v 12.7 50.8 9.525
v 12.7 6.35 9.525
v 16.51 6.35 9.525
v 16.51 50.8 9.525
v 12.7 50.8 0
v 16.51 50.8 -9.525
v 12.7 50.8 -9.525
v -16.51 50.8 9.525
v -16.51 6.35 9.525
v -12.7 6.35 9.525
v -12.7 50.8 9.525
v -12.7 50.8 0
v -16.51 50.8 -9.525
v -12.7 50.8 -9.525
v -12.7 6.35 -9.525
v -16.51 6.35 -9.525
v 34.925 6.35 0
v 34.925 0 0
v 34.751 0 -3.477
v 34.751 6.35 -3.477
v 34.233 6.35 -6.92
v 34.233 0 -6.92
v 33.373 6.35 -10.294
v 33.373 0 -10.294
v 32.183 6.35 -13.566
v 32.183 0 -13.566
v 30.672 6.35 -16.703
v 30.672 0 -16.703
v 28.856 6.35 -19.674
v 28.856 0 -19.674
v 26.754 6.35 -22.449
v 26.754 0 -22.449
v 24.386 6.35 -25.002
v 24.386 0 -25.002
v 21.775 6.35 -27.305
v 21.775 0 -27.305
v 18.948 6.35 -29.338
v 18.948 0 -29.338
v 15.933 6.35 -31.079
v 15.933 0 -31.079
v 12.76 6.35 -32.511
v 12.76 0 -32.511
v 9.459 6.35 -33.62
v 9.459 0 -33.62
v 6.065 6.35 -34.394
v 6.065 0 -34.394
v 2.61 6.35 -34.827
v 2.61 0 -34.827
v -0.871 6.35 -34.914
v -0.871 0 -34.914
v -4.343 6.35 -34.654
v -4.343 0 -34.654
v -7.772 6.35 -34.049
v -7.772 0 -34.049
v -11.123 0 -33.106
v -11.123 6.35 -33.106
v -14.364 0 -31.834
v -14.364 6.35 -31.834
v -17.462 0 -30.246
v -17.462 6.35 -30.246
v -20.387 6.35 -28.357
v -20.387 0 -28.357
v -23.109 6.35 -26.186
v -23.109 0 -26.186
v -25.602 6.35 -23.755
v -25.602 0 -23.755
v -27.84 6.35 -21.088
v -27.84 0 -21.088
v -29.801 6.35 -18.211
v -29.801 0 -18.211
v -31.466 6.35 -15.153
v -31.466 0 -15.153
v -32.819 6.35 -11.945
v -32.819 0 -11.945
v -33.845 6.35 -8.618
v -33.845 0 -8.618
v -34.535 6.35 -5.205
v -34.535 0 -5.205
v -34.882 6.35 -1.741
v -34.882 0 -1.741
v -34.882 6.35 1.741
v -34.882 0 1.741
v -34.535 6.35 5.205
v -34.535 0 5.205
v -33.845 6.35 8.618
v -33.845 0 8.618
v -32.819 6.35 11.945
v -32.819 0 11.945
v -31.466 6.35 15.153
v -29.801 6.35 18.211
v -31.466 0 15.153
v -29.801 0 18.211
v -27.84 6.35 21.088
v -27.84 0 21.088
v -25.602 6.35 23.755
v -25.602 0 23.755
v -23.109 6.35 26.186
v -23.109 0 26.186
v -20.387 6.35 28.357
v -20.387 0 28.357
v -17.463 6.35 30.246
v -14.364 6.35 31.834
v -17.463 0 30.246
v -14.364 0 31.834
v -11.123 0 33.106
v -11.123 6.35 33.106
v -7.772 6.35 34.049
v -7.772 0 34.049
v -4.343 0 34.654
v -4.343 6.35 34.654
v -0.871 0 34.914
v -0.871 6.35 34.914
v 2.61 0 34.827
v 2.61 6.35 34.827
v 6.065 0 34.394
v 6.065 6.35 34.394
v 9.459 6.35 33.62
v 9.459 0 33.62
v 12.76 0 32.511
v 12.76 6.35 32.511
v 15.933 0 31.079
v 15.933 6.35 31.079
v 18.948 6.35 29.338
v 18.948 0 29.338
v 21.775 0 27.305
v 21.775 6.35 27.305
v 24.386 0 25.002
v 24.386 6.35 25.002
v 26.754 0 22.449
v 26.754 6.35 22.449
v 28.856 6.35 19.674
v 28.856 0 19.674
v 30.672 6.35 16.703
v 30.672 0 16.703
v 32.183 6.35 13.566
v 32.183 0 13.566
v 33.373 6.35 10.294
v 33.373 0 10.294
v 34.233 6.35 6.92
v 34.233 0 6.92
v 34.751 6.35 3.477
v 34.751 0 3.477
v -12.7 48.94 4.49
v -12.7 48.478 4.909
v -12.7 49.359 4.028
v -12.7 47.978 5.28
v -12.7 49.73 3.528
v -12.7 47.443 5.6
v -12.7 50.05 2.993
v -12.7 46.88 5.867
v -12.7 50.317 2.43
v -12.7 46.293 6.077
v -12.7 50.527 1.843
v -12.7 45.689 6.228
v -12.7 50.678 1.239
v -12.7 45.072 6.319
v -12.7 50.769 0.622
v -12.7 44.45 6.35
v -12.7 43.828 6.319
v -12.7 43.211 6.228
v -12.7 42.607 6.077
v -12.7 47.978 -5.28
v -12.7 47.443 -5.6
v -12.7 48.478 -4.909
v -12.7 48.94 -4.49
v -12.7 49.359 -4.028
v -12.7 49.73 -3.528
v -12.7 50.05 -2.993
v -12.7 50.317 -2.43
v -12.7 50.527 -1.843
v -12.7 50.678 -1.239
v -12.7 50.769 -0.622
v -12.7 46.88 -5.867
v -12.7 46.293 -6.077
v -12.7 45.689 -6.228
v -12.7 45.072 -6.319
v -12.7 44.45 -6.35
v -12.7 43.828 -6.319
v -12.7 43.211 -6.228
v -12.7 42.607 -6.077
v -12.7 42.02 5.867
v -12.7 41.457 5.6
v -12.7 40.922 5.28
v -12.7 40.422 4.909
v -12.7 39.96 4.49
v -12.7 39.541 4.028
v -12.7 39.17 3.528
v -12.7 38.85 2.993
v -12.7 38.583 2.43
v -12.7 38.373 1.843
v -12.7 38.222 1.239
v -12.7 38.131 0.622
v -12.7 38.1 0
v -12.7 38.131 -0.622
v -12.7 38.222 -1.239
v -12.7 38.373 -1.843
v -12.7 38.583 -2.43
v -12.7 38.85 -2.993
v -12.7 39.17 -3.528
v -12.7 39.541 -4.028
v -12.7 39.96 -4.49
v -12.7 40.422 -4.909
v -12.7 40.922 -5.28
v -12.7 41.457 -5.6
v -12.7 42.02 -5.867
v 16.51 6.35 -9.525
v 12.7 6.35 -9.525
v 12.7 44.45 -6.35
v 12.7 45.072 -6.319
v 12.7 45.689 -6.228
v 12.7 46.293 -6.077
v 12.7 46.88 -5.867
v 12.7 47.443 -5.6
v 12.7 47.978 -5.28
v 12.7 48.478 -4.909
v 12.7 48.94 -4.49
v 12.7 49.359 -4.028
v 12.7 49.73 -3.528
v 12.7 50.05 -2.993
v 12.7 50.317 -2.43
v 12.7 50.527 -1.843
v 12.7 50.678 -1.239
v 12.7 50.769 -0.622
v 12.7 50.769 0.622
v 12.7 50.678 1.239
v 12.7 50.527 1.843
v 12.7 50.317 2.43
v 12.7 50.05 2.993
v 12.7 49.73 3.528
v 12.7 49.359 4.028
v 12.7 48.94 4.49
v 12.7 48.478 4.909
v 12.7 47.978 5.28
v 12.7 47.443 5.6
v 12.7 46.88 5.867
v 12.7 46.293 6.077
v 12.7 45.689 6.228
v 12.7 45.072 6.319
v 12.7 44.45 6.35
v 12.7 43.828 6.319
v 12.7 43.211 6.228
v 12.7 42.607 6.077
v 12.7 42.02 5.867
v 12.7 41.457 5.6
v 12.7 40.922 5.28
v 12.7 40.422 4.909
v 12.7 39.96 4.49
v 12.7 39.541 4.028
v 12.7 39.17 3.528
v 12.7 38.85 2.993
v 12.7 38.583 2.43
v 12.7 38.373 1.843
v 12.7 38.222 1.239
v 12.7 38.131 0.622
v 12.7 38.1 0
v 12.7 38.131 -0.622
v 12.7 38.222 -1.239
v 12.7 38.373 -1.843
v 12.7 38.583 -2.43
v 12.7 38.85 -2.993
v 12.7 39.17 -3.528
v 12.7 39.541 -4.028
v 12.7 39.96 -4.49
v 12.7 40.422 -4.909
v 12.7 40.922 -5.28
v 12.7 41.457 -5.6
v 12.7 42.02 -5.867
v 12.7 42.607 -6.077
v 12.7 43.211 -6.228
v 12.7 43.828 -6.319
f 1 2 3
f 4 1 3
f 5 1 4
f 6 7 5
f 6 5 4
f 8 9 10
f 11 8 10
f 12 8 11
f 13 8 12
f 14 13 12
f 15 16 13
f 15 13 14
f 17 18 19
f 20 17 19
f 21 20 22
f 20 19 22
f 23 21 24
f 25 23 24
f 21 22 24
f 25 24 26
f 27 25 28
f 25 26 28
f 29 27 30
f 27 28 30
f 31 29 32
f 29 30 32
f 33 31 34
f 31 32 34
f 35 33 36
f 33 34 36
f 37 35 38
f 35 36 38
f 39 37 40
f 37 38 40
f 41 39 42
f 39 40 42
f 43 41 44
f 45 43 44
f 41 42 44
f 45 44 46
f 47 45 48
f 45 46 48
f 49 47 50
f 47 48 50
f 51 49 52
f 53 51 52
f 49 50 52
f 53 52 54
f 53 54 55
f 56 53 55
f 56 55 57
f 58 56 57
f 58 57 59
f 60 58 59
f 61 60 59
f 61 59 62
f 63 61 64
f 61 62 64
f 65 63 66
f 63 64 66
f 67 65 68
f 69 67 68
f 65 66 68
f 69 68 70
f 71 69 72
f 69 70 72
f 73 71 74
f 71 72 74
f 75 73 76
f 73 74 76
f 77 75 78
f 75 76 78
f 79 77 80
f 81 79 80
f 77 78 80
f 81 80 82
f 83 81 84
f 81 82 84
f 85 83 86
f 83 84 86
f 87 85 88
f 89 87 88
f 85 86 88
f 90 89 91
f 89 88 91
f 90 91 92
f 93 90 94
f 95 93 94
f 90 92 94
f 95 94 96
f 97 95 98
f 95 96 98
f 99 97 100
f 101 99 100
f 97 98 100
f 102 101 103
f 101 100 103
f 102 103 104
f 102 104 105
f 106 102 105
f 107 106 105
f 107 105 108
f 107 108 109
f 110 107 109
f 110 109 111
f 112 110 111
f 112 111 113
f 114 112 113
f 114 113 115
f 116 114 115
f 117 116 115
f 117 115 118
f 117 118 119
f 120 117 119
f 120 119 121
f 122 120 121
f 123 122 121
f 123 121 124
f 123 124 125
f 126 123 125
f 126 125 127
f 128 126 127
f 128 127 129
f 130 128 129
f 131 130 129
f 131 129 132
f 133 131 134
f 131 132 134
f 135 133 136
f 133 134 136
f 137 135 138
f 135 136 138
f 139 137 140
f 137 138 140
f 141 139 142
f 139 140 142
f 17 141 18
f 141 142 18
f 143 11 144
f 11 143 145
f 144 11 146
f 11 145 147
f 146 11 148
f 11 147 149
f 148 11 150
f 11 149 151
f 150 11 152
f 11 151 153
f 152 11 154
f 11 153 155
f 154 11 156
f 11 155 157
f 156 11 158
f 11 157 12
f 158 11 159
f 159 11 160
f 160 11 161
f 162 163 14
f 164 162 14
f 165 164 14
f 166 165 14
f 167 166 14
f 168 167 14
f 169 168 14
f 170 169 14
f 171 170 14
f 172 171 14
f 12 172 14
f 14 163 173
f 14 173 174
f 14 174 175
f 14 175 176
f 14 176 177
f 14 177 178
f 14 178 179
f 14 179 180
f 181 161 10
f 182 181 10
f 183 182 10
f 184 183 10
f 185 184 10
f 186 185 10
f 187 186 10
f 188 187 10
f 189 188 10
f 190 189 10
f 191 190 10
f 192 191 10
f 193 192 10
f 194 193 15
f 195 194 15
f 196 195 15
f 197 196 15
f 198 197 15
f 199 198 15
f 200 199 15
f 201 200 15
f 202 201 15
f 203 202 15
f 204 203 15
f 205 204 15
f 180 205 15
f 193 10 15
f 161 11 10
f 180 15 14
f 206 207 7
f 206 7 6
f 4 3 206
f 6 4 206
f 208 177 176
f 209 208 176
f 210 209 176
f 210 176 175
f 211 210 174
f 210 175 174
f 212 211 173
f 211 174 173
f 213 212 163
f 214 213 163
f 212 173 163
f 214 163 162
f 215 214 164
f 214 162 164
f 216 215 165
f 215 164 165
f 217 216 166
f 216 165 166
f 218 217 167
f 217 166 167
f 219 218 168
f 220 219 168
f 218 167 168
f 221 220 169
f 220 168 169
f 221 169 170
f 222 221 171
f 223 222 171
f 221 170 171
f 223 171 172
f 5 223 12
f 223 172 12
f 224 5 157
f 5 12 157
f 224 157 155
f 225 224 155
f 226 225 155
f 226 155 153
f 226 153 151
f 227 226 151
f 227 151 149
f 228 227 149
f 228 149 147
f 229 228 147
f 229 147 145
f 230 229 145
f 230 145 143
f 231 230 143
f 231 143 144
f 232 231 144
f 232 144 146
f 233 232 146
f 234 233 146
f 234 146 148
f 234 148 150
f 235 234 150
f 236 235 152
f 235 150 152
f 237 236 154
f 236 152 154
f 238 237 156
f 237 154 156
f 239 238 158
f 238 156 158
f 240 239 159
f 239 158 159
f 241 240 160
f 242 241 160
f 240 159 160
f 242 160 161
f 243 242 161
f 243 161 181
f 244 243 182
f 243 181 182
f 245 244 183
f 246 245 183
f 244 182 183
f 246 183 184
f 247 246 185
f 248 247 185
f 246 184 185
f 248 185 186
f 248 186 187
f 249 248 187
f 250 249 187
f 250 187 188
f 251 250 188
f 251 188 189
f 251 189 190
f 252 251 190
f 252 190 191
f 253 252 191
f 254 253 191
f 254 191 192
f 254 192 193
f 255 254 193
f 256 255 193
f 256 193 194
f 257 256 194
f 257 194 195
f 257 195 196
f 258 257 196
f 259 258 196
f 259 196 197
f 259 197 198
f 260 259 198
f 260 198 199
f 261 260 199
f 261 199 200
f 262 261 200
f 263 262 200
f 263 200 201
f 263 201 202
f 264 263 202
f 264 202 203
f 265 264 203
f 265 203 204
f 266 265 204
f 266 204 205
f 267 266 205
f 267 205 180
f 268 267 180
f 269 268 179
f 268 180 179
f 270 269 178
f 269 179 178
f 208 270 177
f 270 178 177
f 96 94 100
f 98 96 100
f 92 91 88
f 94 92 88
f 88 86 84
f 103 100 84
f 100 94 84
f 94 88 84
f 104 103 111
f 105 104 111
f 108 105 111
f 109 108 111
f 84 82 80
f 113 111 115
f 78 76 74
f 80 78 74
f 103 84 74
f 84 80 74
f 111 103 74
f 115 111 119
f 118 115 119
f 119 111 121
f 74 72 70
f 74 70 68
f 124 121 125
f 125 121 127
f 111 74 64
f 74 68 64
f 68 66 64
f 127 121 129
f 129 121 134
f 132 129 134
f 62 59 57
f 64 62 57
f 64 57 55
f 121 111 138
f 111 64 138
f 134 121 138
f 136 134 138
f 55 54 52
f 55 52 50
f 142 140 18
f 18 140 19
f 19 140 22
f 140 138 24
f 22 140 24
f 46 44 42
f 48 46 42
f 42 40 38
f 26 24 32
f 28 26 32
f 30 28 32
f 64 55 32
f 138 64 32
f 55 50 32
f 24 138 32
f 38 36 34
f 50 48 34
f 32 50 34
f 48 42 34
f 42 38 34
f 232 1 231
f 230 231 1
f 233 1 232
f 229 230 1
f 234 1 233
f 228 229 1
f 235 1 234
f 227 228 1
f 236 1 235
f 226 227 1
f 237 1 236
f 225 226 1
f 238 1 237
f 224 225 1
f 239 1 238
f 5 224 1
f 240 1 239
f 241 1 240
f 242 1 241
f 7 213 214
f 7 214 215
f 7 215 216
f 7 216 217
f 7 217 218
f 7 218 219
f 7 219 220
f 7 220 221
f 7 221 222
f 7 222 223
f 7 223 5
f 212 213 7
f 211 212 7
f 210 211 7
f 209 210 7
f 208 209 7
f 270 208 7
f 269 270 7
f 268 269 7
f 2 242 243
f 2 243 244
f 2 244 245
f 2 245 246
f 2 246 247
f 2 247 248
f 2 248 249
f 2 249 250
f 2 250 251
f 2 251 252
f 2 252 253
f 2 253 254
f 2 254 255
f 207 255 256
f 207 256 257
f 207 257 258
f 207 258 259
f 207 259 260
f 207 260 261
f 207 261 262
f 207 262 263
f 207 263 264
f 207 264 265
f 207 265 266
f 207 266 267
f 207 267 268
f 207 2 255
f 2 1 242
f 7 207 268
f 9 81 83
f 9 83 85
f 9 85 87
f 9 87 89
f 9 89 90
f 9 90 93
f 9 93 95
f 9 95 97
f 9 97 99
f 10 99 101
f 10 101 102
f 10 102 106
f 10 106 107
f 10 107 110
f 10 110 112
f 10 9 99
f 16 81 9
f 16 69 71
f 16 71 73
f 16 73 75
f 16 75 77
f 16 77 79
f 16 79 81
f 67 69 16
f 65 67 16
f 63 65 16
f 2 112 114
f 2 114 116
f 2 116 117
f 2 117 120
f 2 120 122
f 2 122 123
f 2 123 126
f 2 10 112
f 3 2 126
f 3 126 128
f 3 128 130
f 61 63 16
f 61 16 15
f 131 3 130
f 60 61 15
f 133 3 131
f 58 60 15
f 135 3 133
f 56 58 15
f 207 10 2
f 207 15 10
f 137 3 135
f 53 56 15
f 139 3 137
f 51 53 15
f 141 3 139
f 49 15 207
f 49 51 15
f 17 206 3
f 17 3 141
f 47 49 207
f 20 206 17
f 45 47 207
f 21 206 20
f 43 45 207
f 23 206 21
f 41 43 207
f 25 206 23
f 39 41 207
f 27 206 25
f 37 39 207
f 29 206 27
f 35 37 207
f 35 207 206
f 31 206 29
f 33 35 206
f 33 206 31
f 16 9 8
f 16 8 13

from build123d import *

# Parameters (mm, degrees)
SKETCH1_R           = 34.925
BOSS_EXTRUDE1_DEPTH = 6.35
SKETCH2_W           = 3.81
SKETCH2_H           = 19.05
BOSS_EXTRUDE2_DEPTH = 44.45
SKETCH3_R           = 6.35
BOSS_EXTRUDE3_DEPTH = 25.4


with BuildPart() as part:
    # Sketch1 → Boss-Extrude1 (new body)
    with BuildSketch(Plane(origin=(0, 0, 0), x_dir=(1, 0, 0), z_dir=(0, 1, 0))):
        Circle(SKETCH1_R)
    extrude(amount=BOSS_EXTRUDE1_DEPTH)

    # Sketch2 → Boss-Extrude2 (add)
    with BuildSketch(Plane(origin=(0, 6.35, 0), x_dir=(1, 0, 0), z_dir=(0, 1, 0))):
        with Locations((-14.605, 0)):
            Rectangle(SKETCH2_W, SKETCH2_H)
        with Locations((14.605, 0)):
            Rectangle(SKETCH2_W, SKETCH2_H)
    extrude(amount=BOSS_EXTRUDE2_DEPTH)

    # Sketch3 → Boss-Extrude3 (add)
    with BuildSketch(Plane(origin=(-12.7, 0, 0), x_dir=(0, 0, -1), z_dir=(1, 0, 0))):
        with Locations((0, 44.45)):
            Circle(SKETCH3_R)
    extrude(amount=BOSS_EXTRUDE3_DEPTH)


solid = part.part
